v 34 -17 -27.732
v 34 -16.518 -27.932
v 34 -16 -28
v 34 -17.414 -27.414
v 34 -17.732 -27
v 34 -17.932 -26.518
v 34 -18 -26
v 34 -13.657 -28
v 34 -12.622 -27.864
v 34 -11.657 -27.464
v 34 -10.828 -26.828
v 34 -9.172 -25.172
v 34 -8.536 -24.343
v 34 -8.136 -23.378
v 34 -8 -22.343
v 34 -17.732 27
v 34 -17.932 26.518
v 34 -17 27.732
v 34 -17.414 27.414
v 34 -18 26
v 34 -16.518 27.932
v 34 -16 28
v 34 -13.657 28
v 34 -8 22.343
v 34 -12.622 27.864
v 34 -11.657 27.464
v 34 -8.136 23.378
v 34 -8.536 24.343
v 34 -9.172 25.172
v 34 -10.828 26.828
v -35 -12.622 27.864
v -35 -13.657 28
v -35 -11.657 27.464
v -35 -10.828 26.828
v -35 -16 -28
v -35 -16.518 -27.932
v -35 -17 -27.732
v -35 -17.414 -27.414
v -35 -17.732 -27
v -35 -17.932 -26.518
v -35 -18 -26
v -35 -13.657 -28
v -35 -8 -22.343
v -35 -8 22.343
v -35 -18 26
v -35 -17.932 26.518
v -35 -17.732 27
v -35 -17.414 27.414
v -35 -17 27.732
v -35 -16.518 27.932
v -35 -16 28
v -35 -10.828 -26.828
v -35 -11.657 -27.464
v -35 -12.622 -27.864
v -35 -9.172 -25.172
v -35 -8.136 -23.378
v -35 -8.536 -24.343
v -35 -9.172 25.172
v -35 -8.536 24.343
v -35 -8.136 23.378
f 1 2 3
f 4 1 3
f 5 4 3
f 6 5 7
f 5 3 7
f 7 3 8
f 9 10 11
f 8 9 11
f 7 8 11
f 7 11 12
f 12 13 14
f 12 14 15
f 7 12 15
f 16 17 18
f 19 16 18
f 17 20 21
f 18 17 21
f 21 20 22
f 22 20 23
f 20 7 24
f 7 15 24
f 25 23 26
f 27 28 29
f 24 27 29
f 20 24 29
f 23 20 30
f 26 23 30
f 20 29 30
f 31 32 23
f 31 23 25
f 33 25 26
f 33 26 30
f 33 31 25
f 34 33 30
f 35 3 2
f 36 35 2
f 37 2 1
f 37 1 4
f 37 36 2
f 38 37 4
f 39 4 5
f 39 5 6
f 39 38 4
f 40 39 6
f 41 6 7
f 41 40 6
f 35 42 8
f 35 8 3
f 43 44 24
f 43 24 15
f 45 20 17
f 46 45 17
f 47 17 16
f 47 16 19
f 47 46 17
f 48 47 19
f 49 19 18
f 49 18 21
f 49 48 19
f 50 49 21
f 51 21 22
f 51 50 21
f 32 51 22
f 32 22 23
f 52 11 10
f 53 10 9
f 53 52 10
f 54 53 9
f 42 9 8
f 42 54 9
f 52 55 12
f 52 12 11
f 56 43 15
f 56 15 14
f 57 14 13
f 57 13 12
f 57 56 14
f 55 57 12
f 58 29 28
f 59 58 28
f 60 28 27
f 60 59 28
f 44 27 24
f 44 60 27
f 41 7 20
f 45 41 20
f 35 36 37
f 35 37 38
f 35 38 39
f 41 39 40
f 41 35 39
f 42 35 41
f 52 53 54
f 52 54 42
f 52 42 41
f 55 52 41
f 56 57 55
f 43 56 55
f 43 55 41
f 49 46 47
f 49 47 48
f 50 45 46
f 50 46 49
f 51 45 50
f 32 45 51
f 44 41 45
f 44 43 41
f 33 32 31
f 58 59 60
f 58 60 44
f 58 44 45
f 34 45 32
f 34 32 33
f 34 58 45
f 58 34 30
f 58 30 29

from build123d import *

# Parameters (mm, degrees)
BOSS_EXTRUDE1_START = -35
BOSS_EXTRUDE1_DEPTH = 69


with BuildPart() as part:
    # Sketch2 → Boss-Extrude1 (new body)
    with BuildSketch(Plane(origin=(0, 0, 0), x_dir=(0, 0, -1), z_dir=(1, 0, 0)).offset(BOSS_EXTRUDE1_START)):
        with BuildLine():
            Line((28, -13.656854249), (28, -16))
            ThreePointArc((28, -16), (27.414213562, -17.414213562), (26, -18))
            Line((26, -18), (-26, -18))
            ThreePointArc((-26, -18), (-27.414213562, -17.414213562), (-28, -16))
            Line((-28, -16), (-28, -13.656854249))
            ThreePointArc((-28, -13.656854249), (-27.69551813, -12.12612052), (-26.828427125, -10.828427125))
            Line((-26.828427125, -10.828427125), (-25.171572875, -9.171572875))
            ThreePointArc((-25.171572875, -9.171572875), (-23.87387948, -8.30448187), (-22.343145751, -8))
            Line((-22.343145751, -8), (22.343145751, -8))
            ThreePointArc((22.343145751, -8), (23.87387948, -8.30448187), (25.171572875, -9.171572875))
            Line((25.171572875, -9.171572875), (26.828427125, -10.828427125))
            ThreePointArc((26.828427125, -10.828427125), (27.69551813, -12.12612052), (28, -13.656854249))
        make_face()
    extrude(amount=BOSS_EXTRUDE1_DEPTH)


solid = part.part
